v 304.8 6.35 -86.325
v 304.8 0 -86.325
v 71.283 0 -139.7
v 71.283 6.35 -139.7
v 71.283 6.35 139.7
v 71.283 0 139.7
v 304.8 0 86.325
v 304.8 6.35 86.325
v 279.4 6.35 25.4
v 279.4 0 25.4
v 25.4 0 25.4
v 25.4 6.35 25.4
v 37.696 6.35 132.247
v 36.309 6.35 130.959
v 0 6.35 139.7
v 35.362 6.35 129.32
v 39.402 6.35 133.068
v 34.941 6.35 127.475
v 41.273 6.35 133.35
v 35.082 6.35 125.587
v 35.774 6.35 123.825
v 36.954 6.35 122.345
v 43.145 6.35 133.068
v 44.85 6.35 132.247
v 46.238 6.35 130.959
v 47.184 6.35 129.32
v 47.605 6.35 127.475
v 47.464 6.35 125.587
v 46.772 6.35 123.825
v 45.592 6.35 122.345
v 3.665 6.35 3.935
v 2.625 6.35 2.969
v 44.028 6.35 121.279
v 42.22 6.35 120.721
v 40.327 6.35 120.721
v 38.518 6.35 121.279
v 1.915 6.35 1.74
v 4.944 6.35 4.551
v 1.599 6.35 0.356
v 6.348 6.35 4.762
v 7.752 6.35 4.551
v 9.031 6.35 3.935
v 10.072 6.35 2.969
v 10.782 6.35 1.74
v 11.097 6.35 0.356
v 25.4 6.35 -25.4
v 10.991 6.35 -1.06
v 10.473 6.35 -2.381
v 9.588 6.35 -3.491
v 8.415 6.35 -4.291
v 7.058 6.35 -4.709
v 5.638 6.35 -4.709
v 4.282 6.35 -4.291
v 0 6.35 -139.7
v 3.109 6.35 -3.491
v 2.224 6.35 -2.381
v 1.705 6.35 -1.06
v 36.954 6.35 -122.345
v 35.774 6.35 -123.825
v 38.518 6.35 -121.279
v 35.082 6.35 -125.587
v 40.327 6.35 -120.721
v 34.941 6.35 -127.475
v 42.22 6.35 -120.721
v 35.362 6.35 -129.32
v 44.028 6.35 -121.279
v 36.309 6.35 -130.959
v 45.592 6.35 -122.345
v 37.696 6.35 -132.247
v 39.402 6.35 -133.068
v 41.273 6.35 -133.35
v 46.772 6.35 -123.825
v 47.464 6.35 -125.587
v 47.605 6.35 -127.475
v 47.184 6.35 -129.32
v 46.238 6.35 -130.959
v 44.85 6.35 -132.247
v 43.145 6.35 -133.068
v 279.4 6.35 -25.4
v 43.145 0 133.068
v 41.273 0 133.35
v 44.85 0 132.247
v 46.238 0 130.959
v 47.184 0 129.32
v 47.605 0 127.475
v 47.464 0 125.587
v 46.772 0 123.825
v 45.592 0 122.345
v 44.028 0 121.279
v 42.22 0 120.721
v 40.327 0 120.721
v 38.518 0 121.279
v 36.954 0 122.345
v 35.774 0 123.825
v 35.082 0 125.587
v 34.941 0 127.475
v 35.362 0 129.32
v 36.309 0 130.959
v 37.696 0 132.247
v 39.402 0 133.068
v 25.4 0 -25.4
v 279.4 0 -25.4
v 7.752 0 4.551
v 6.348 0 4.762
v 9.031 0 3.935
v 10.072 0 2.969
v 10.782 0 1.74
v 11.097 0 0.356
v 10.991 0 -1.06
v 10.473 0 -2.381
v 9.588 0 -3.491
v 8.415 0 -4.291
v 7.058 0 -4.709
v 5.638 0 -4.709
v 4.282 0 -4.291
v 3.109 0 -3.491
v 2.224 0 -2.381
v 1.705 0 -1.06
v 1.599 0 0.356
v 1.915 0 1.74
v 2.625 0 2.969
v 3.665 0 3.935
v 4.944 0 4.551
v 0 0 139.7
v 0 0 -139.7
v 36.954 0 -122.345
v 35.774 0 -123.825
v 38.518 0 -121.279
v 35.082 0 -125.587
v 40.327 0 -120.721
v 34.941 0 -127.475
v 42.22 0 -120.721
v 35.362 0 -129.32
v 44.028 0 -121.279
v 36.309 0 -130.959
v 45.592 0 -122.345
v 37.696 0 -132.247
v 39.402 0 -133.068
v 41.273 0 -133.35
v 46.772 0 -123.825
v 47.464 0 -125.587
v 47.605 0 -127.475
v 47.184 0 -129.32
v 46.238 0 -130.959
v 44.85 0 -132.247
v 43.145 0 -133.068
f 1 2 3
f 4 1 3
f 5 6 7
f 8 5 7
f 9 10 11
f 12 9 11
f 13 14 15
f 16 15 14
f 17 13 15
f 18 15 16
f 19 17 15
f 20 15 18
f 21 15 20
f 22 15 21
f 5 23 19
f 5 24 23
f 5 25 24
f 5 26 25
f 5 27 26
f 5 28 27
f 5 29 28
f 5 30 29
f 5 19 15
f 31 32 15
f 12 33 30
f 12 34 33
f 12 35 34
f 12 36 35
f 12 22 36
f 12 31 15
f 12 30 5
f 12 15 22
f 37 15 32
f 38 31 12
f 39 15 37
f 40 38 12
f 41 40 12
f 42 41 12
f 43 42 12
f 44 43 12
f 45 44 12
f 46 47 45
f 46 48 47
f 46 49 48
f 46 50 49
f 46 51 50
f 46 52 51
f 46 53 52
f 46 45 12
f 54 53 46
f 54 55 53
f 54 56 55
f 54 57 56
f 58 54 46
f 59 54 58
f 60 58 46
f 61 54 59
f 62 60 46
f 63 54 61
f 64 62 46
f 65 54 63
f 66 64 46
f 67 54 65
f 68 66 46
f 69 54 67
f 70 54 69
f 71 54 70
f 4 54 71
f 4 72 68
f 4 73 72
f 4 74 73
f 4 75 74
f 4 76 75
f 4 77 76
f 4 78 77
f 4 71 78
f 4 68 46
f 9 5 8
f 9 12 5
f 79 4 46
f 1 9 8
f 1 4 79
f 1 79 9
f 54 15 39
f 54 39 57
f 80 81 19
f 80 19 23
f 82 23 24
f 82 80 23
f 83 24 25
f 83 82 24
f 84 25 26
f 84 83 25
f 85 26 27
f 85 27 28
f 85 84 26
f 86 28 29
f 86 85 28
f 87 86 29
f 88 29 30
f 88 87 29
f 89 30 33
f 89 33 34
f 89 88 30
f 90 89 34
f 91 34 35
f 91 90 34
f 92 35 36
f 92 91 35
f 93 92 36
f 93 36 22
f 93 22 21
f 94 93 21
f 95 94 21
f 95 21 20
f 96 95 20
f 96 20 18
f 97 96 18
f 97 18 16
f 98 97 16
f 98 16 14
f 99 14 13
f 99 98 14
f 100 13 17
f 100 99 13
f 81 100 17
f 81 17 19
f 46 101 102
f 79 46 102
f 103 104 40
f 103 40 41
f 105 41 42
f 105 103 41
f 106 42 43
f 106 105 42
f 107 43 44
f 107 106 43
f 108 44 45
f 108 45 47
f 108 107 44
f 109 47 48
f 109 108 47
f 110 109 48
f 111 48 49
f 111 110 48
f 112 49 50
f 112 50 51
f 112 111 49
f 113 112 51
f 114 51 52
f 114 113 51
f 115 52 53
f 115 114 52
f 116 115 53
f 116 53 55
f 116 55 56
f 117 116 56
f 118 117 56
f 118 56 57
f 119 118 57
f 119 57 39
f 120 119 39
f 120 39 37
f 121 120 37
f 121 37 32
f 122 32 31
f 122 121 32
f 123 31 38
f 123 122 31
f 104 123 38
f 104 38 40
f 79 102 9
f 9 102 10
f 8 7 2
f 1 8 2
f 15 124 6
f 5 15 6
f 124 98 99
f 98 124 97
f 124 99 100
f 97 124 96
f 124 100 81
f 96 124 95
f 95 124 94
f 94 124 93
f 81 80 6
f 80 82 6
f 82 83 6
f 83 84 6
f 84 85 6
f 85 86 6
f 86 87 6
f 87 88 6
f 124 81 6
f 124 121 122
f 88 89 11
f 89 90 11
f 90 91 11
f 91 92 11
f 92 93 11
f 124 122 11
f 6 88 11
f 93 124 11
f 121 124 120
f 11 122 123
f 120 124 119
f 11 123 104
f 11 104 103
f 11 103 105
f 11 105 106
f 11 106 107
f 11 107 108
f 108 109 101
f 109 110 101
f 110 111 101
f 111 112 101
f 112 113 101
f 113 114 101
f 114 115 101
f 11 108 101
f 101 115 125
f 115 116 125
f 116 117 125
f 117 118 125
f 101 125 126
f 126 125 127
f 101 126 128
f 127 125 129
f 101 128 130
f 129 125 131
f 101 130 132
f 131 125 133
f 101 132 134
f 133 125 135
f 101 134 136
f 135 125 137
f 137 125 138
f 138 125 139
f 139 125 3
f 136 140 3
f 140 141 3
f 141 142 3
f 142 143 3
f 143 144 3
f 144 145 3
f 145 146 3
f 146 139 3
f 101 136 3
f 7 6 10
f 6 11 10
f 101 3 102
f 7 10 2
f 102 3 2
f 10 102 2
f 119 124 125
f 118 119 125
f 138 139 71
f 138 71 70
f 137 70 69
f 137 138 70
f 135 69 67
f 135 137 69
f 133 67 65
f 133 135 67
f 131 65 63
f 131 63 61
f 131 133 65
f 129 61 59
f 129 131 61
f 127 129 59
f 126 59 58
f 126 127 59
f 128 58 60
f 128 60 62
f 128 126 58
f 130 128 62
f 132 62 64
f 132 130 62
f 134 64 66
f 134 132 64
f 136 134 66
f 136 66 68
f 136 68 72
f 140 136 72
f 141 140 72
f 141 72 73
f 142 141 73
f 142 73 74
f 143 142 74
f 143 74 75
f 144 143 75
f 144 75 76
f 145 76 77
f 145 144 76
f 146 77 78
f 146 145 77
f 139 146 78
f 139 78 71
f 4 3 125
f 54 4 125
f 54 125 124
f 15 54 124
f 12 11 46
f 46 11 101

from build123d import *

# Parameters (mm, degrees)
SKETCH1_R           = 6.35
SKETCH1_R_2         = 4.7625
BOSS_EXTRUDE1_DEPTH = 6.35


with BuildPart() as part:
    # Sketch1 → Boss-Extrude1 (new body)
    with BuildSketch(Plane(origin=(0, 0, 0), x_dir=(1, 0, 0), z_dir=(0, 1, 0))):
        Polygon((0, -86.324674442), (0, -139.7), (71.282950652, -139.7), (304.8, -86.324674442), (304.8, 86.324674442), (71.282950652, 139.7), (0, 139.7), (0, 86.324674442), (0, 6.35), (0, -6.35), align=None)
        with Locations(Location((41.27321438, -127, 0), (0, 0, 270))):
            Circle(SKETCH1_R, mode=Mode.SUBTRACT)
        with Locations(Location((41.27321438, 127, 0), (0, 0, 90))):
            Circle(SKETCH1_R, mode=Mode.SUBTRACT)
        with Locations(Location((6.34821438, 0, 0), (0, 0, 270))):
            Circle(SKETCH1_R_2, mode=Mode.SUBTRACT)
        Polygon((279.4, 25.4), (279.4, -25.4), (25.4, -25.4), (25.4, -6.35), (25.4, 6.35), (25.4, 25.4), align=None, mode=Mode.SUBTRACT)
    extrude(amount=BOSS_EXTRUDE1_DEPTH)


solid = part.part
